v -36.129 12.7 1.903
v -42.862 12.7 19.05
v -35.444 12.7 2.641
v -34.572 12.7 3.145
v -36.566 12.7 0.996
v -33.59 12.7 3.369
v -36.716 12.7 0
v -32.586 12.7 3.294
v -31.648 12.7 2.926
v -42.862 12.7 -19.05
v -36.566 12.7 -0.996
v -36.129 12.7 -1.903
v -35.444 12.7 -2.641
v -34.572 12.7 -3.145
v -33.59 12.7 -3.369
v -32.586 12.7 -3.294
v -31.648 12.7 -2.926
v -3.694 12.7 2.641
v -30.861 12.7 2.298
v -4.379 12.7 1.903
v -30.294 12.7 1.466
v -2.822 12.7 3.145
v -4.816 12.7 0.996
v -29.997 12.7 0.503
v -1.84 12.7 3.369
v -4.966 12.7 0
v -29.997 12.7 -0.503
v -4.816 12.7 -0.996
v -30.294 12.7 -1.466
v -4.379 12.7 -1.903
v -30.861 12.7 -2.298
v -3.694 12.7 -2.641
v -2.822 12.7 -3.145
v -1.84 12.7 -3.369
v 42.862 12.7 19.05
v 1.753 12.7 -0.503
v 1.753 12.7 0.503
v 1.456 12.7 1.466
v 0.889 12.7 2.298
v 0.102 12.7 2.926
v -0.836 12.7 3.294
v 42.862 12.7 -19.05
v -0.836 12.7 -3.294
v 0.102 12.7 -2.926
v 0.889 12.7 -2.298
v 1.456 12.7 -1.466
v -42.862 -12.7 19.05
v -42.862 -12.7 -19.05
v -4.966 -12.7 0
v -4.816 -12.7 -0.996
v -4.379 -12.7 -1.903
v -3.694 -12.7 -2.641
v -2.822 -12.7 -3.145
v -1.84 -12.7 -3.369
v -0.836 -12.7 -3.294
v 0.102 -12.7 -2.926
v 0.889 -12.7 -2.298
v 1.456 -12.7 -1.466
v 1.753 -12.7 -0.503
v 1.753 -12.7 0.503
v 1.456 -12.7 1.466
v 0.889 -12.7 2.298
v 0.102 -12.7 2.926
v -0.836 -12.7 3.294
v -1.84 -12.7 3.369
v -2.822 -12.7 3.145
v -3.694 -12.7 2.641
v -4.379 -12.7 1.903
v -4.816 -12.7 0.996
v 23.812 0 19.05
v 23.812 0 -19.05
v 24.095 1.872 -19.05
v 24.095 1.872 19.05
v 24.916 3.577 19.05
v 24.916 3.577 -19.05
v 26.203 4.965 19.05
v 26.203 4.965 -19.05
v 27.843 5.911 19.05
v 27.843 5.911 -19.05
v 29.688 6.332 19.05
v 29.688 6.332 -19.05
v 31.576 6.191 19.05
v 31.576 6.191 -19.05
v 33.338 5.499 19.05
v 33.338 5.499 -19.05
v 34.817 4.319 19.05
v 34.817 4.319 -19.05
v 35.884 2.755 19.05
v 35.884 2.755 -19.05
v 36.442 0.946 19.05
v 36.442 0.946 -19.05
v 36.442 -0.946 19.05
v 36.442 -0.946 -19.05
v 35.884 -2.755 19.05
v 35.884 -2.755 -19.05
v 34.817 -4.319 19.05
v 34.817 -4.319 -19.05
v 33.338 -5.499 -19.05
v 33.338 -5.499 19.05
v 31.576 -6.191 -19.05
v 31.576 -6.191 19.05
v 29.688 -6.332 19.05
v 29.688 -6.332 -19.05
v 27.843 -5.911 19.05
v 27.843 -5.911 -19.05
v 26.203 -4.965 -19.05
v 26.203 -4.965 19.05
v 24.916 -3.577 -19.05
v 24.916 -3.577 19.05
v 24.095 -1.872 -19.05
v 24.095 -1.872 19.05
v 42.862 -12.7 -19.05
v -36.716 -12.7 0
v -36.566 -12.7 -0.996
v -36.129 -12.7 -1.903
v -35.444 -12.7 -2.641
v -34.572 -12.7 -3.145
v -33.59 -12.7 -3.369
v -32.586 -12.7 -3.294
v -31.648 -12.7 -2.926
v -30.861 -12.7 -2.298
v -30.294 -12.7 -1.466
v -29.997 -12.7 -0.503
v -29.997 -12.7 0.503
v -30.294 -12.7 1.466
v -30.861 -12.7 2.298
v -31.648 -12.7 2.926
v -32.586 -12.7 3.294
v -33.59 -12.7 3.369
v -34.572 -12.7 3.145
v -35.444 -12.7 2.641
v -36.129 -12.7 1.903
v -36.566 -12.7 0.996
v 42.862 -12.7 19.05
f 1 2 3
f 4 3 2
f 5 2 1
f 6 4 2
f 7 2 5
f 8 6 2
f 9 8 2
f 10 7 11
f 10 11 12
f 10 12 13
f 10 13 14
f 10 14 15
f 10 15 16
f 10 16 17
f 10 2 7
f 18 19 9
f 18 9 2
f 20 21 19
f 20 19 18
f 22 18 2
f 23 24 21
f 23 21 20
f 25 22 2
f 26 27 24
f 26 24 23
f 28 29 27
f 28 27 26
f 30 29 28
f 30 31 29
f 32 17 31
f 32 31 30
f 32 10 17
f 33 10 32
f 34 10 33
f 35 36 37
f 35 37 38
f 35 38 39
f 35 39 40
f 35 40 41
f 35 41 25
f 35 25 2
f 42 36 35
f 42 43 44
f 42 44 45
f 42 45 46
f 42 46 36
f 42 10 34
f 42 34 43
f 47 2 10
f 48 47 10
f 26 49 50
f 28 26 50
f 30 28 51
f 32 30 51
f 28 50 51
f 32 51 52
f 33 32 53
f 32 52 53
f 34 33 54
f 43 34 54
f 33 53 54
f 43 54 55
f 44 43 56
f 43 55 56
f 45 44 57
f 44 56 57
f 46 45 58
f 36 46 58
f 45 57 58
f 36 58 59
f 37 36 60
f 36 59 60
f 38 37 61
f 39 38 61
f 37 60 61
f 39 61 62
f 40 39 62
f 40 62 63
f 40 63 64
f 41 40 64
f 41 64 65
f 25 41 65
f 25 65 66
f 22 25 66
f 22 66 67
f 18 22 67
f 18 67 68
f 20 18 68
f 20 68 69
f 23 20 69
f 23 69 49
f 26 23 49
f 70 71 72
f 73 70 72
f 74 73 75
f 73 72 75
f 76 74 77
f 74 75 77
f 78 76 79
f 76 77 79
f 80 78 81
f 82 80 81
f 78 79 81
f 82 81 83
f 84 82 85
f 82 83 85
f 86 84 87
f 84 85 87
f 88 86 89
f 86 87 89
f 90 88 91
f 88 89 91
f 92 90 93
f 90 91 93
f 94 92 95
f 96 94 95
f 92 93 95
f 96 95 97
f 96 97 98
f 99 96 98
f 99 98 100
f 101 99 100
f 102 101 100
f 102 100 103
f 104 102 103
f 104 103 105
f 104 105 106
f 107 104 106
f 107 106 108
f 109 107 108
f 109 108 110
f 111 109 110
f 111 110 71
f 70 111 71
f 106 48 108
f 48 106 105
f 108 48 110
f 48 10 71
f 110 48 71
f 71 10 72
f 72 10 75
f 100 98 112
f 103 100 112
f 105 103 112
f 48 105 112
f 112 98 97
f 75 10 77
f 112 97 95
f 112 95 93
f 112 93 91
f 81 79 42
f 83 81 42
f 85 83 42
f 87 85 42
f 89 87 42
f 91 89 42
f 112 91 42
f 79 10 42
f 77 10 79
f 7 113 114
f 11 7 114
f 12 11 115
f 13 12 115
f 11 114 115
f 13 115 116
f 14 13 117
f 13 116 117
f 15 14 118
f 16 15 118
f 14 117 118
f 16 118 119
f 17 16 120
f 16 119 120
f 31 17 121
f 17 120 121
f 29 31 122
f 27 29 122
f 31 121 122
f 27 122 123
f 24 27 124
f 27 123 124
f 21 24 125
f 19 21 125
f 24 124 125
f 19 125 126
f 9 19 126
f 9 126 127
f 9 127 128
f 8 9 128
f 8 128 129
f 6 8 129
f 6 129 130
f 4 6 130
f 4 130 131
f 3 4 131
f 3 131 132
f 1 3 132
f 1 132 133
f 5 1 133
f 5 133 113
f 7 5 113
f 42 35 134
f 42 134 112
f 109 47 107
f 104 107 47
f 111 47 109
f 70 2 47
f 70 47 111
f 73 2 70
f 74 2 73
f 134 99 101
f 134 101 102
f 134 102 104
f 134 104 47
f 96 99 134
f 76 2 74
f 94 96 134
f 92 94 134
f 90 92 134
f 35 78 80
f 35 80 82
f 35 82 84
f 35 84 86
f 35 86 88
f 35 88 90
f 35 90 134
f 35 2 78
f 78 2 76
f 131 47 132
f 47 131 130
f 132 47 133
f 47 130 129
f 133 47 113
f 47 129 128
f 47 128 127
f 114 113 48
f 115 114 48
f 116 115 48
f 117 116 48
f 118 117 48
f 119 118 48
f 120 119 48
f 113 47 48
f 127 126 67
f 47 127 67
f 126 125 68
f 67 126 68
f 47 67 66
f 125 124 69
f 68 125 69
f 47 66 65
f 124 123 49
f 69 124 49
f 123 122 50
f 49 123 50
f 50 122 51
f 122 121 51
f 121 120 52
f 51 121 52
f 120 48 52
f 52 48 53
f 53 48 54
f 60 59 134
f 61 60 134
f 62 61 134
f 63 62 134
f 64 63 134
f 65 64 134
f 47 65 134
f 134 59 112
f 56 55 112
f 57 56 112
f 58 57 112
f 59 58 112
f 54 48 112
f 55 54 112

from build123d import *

# Parameters (mm, degrees)
SKETCH1_W                  = 85.725
SKETCH1_H                  = 38.1
BOSS_EXTRUDE1_DEPTH        = 12.7
F_1_2_0_5_DIAMETER_HOLE1_D = 12.7
F_1_4_CLEARANCE_HOLE1_D    = 6.7564


with BuildPart() as part:
    # Sketch1 → Boss-Extrude1 (new, symmetric)
    with BuildSketch(Plane(origin=(0, 0, 0), x_dir=(1, 0, 0), z_dir=(0, 1, 0))):
        Rectangle(SKETCH1_W, SKETCH1_H)
    extrude(amount=BOSS_EXTRUDE1_DEPTH, both=True)

    # 1/2 (0.5) Diameter Hole1 (through all)
    with Locations(Plane.XY.offset(19.05)):
        with Locations((30.1625, 0)):
            Hole(F_1_2_0_5_DIAMETER_HOLE1_D / 2)

    # 1/4 Clearance Hole1 (through all)
    with Locations(Plane(origin=(0, 12.7, 0), x_dir=(1, 0, 0), z_dir=(0, 1, 0))):
        with Locations((-33.3375, 0), (-1.5875, 0)):
            Hole(F_1_4_CLEARANCE_HOLE1_D / 2)


solid = part.part
